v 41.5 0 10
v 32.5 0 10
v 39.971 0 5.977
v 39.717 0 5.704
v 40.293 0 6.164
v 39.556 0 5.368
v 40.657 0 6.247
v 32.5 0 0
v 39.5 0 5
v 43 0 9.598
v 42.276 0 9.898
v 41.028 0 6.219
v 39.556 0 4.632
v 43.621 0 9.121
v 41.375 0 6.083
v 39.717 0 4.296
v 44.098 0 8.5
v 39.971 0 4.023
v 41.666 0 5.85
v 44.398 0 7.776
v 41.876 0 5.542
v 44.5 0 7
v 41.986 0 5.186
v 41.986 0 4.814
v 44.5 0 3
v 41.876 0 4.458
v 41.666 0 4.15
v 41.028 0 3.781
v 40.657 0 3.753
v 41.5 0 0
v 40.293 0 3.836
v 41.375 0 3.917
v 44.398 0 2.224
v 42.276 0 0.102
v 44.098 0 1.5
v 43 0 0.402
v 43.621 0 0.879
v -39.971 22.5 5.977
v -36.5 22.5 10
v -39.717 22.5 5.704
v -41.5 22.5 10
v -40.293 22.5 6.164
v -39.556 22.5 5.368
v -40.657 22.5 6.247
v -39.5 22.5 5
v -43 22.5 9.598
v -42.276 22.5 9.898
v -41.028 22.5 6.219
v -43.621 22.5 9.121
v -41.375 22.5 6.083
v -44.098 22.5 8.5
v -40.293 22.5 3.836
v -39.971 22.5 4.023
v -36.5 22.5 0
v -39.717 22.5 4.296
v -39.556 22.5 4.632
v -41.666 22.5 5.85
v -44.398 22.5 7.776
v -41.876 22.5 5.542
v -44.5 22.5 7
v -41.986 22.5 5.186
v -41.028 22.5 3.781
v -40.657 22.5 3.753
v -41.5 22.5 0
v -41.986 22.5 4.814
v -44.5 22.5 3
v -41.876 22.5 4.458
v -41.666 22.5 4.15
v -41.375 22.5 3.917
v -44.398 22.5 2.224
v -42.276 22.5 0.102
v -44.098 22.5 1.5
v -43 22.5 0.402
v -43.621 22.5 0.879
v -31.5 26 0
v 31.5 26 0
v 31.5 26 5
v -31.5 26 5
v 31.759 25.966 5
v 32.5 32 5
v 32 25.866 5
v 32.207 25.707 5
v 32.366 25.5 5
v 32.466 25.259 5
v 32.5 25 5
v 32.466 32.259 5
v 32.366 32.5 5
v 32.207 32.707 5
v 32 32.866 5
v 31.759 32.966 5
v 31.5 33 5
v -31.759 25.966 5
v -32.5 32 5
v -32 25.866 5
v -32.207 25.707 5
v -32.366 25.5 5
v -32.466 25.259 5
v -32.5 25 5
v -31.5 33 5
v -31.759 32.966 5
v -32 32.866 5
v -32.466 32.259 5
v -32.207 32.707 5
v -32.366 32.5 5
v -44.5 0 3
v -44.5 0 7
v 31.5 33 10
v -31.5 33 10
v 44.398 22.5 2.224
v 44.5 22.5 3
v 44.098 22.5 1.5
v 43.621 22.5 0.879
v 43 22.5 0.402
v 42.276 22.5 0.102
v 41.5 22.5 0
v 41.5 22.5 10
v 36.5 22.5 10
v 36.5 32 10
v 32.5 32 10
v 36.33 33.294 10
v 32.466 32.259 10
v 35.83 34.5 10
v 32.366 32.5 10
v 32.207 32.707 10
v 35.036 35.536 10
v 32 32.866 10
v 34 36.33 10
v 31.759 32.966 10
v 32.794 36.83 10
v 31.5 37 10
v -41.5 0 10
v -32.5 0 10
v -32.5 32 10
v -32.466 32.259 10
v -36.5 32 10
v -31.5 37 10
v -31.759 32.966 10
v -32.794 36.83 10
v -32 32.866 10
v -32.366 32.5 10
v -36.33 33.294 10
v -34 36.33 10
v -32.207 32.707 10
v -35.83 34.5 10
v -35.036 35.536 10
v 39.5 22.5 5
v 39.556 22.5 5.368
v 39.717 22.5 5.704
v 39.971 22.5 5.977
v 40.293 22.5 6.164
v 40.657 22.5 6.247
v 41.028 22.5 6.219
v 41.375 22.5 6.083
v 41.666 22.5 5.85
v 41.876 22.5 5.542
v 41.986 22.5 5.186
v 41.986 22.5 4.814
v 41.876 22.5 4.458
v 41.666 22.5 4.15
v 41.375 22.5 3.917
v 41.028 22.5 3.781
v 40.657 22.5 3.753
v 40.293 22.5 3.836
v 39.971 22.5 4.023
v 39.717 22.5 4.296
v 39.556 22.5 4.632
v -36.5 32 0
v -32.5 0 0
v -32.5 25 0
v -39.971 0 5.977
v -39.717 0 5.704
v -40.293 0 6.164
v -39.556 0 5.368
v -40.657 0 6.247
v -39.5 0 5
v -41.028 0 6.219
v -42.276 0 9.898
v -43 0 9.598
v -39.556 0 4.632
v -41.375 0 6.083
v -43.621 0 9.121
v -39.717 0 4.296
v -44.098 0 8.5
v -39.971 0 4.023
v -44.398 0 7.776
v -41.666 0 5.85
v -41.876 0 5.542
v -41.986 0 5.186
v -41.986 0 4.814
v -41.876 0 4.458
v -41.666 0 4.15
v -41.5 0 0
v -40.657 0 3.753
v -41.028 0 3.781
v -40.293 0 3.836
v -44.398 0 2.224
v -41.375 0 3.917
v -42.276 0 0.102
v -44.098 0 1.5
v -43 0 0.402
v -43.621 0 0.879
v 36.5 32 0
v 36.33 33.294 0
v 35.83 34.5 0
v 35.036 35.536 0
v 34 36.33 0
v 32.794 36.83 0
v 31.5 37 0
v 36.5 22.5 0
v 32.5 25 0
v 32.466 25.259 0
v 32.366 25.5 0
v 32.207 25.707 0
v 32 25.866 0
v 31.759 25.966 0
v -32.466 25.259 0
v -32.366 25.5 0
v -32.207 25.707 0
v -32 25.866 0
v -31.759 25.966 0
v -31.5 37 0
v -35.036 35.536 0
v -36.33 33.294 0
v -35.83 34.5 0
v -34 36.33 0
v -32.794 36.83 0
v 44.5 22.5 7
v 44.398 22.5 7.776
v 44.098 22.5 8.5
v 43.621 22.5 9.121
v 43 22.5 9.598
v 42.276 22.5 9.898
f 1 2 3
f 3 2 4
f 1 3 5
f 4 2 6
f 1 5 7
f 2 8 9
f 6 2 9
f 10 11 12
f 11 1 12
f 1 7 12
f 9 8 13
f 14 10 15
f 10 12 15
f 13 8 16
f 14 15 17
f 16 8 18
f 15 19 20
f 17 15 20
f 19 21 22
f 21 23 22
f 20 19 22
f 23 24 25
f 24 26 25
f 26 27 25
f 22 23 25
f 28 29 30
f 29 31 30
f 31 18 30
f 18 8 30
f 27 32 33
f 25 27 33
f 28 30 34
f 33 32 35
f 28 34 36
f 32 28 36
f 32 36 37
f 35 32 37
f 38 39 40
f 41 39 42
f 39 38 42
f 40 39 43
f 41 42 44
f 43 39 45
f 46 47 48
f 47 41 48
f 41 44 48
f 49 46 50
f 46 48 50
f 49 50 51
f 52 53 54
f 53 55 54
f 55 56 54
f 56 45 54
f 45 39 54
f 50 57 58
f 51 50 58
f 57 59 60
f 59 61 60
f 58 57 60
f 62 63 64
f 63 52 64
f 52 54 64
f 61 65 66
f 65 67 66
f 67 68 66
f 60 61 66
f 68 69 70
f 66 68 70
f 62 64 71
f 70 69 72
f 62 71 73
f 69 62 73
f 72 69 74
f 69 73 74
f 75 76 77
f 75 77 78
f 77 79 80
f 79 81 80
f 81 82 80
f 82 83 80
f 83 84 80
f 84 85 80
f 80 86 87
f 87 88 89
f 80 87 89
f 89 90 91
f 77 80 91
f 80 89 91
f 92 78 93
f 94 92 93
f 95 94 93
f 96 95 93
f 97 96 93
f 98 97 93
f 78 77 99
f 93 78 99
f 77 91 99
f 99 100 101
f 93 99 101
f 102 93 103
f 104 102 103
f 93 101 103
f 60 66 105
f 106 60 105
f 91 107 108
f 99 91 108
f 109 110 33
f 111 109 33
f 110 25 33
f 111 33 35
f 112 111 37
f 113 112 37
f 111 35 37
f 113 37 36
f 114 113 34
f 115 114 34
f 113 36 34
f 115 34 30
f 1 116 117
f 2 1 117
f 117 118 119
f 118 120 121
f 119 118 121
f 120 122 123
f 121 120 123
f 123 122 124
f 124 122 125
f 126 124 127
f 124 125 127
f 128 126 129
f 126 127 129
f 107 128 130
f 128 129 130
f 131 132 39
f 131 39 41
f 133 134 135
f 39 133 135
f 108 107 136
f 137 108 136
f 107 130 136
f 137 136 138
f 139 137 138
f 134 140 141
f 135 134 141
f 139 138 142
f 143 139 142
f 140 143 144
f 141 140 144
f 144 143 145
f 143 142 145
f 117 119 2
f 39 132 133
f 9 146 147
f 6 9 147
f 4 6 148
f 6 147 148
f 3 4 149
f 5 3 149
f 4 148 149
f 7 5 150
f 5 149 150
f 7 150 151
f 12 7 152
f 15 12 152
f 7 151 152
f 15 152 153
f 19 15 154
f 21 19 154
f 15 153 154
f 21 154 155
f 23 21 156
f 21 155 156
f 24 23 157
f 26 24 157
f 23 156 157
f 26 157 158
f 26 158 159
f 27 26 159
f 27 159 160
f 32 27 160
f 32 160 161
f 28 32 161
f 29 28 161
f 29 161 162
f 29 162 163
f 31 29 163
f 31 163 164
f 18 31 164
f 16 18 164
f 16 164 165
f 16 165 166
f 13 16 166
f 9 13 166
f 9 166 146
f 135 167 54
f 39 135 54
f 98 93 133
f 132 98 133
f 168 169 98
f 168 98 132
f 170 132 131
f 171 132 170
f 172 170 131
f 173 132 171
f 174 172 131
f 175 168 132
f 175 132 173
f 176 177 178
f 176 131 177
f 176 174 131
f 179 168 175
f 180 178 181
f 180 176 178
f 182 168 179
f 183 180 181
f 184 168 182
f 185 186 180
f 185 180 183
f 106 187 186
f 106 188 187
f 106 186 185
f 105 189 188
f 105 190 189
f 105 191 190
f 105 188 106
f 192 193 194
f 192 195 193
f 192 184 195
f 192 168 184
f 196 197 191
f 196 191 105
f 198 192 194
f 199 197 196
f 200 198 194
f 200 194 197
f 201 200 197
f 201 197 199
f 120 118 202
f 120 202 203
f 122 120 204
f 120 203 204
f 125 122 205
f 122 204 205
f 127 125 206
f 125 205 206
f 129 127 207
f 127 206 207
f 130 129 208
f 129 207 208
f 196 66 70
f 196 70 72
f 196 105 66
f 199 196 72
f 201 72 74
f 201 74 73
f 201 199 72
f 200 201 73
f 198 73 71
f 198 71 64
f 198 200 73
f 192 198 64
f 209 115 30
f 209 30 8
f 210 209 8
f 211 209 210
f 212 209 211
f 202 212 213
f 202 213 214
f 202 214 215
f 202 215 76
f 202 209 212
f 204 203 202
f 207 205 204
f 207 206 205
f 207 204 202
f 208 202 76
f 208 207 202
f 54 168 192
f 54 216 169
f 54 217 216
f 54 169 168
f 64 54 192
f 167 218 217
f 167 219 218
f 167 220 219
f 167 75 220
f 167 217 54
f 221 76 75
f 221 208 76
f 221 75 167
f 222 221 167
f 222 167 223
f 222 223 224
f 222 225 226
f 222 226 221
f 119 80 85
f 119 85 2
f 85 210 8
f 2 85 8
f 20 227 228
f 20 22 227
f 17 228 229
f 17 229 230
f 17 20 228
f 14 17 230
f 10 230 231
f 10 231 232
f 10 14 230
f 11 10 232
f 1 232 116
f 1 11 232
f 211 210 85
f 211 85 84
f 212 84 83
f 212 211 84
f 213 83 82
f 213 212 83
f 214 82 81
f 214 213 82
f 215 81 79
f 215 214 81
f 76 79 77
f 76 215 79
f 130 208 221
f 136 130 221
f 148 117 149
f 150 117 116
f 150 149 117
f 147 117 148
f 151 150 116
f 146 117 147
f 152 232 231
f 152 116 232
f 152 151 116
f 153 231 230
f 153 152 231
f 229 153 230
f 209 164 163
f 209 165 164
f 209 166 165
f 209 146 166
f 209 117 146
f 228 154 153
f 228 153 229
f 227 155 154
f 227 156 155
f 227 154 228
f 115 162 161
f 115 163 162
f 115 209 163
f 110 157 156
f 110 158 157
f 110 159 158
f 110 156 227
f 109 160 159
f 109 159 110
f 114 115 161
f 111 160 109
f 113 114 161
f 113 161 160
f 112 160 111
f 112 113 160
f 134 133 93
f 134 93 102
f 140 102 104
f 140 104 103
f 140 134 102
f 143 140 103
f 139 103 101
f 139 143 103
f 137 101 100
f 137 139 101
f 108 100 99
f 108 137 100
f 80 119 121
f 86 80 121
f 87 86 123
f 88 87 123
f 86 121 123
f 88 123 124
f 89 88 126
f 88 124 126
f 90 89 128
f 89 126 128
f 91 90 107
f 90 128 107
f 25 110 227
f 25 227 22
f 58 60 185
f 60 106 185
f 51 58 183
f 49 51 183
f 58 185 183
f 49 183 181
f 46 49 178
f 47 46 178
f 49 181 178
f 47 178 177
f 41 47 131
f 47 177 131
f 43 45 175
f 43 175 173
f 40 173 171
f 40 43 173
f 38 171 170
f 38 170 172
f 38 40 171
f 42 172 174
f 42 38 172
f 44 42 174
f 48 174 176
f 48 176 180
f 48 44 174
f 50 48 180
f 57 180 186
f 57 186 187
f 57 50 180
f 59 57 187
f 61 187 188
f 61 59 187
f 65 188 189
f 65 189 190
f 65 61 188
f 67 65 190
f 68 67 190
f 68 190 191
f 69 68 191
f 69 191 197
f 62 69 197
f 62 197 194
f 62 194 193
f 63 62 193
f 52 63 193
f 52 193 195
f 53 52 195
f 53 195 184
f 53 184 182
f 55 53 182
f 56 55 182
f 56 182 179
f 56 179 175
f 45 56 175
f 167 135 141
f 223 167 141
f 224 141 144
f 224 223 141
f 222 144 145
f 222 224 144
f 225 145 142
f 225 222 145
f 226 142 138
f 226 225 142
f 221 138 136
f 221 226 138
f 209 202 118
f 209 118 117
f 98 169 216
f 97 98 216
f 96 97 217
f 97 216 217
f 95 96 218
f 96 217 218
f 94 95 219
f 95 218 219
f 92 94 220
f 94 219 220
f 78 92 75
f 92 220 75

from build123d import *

# Parameters (mm, degrees)
PAD_DEPTH       = 10
SKETCH001_R     = 1.25
POCKET_DEPTH    = 22.501
POCKET001_DEPTH = 5
FILLET_R        = 3


with BuildPart() as part:
    # Sketch → Pad (new body)
    with BuildSketch(Plane.XY):
        with BuildLine():
            Line((0, 26), (31.5, 26))
            ThreePointArc((32.5, 25), (32.207107, 25.707107), (31.5, 26))
            Line((32.5, 25), (32.5, 0))
            Line((32.5, 0), (44.5, 0))
            Line((44.5, 22.5), (44.5, 0))
            Line((36.5, 22.5), (44.5, 22.5))
            Line((36.5, 32), (36.5, 22.5))
            ThreePointArc((36.5, 32), (35.035534, 35.535534), (31.5, 37))
            Line((0, 37), (31.5, 37))
            Line((0, 37), (0, 26))
        make_face()
    extrude(amount=PAD_DEPTH)

    # Sketch001 (on Face7 of Pad) → Pocket (cut, through all)
    with BuildSketch(Plane(origin=(0, 22.5, 0), x_dir=(-1, 0, 0), z_dir=(0, 1, 0))):
        with Locations((-40.75, 5)):
            Circle(SKETCH001_R)
    extrude(amount=-POCKET_DEPTH, mode=Mode.SUBTRACT)

    # Sketch002 (on Face5 of Pocket) → Pocket001 (cut)
    with BuildSketch(Plane.XY.offset(10)):
        with BuildLine():
            Line((0, 0), (32.5, 0))
            Line((32.5, 0), (32.5, 32))
            ThreePointArc((32.5, 32), (32.207107, 32.707107), (31.5, 33))
            Line((0, 33), (31.5, 33))
            Line((0, 0), (0, 33))
        make_face()
    extrude(amount=-POCKET001_DEPTH, mode=Mode.SUBTRACT)

    # Fillet
    fillet_edges = [part.edges().sort_by_distance(p)[0] for p in [
        (44.5, 11.25, 10),
        (44.5, 11.25, 0),
    ]]
    fillet(fillet_edges, radius=FILLET_R)

    # Mirrored: part across YZ


with BuildPart() as part_1:
    add(part.part)
    add(part.part.mirror(Plane.YZ))


solid = part_1.part
